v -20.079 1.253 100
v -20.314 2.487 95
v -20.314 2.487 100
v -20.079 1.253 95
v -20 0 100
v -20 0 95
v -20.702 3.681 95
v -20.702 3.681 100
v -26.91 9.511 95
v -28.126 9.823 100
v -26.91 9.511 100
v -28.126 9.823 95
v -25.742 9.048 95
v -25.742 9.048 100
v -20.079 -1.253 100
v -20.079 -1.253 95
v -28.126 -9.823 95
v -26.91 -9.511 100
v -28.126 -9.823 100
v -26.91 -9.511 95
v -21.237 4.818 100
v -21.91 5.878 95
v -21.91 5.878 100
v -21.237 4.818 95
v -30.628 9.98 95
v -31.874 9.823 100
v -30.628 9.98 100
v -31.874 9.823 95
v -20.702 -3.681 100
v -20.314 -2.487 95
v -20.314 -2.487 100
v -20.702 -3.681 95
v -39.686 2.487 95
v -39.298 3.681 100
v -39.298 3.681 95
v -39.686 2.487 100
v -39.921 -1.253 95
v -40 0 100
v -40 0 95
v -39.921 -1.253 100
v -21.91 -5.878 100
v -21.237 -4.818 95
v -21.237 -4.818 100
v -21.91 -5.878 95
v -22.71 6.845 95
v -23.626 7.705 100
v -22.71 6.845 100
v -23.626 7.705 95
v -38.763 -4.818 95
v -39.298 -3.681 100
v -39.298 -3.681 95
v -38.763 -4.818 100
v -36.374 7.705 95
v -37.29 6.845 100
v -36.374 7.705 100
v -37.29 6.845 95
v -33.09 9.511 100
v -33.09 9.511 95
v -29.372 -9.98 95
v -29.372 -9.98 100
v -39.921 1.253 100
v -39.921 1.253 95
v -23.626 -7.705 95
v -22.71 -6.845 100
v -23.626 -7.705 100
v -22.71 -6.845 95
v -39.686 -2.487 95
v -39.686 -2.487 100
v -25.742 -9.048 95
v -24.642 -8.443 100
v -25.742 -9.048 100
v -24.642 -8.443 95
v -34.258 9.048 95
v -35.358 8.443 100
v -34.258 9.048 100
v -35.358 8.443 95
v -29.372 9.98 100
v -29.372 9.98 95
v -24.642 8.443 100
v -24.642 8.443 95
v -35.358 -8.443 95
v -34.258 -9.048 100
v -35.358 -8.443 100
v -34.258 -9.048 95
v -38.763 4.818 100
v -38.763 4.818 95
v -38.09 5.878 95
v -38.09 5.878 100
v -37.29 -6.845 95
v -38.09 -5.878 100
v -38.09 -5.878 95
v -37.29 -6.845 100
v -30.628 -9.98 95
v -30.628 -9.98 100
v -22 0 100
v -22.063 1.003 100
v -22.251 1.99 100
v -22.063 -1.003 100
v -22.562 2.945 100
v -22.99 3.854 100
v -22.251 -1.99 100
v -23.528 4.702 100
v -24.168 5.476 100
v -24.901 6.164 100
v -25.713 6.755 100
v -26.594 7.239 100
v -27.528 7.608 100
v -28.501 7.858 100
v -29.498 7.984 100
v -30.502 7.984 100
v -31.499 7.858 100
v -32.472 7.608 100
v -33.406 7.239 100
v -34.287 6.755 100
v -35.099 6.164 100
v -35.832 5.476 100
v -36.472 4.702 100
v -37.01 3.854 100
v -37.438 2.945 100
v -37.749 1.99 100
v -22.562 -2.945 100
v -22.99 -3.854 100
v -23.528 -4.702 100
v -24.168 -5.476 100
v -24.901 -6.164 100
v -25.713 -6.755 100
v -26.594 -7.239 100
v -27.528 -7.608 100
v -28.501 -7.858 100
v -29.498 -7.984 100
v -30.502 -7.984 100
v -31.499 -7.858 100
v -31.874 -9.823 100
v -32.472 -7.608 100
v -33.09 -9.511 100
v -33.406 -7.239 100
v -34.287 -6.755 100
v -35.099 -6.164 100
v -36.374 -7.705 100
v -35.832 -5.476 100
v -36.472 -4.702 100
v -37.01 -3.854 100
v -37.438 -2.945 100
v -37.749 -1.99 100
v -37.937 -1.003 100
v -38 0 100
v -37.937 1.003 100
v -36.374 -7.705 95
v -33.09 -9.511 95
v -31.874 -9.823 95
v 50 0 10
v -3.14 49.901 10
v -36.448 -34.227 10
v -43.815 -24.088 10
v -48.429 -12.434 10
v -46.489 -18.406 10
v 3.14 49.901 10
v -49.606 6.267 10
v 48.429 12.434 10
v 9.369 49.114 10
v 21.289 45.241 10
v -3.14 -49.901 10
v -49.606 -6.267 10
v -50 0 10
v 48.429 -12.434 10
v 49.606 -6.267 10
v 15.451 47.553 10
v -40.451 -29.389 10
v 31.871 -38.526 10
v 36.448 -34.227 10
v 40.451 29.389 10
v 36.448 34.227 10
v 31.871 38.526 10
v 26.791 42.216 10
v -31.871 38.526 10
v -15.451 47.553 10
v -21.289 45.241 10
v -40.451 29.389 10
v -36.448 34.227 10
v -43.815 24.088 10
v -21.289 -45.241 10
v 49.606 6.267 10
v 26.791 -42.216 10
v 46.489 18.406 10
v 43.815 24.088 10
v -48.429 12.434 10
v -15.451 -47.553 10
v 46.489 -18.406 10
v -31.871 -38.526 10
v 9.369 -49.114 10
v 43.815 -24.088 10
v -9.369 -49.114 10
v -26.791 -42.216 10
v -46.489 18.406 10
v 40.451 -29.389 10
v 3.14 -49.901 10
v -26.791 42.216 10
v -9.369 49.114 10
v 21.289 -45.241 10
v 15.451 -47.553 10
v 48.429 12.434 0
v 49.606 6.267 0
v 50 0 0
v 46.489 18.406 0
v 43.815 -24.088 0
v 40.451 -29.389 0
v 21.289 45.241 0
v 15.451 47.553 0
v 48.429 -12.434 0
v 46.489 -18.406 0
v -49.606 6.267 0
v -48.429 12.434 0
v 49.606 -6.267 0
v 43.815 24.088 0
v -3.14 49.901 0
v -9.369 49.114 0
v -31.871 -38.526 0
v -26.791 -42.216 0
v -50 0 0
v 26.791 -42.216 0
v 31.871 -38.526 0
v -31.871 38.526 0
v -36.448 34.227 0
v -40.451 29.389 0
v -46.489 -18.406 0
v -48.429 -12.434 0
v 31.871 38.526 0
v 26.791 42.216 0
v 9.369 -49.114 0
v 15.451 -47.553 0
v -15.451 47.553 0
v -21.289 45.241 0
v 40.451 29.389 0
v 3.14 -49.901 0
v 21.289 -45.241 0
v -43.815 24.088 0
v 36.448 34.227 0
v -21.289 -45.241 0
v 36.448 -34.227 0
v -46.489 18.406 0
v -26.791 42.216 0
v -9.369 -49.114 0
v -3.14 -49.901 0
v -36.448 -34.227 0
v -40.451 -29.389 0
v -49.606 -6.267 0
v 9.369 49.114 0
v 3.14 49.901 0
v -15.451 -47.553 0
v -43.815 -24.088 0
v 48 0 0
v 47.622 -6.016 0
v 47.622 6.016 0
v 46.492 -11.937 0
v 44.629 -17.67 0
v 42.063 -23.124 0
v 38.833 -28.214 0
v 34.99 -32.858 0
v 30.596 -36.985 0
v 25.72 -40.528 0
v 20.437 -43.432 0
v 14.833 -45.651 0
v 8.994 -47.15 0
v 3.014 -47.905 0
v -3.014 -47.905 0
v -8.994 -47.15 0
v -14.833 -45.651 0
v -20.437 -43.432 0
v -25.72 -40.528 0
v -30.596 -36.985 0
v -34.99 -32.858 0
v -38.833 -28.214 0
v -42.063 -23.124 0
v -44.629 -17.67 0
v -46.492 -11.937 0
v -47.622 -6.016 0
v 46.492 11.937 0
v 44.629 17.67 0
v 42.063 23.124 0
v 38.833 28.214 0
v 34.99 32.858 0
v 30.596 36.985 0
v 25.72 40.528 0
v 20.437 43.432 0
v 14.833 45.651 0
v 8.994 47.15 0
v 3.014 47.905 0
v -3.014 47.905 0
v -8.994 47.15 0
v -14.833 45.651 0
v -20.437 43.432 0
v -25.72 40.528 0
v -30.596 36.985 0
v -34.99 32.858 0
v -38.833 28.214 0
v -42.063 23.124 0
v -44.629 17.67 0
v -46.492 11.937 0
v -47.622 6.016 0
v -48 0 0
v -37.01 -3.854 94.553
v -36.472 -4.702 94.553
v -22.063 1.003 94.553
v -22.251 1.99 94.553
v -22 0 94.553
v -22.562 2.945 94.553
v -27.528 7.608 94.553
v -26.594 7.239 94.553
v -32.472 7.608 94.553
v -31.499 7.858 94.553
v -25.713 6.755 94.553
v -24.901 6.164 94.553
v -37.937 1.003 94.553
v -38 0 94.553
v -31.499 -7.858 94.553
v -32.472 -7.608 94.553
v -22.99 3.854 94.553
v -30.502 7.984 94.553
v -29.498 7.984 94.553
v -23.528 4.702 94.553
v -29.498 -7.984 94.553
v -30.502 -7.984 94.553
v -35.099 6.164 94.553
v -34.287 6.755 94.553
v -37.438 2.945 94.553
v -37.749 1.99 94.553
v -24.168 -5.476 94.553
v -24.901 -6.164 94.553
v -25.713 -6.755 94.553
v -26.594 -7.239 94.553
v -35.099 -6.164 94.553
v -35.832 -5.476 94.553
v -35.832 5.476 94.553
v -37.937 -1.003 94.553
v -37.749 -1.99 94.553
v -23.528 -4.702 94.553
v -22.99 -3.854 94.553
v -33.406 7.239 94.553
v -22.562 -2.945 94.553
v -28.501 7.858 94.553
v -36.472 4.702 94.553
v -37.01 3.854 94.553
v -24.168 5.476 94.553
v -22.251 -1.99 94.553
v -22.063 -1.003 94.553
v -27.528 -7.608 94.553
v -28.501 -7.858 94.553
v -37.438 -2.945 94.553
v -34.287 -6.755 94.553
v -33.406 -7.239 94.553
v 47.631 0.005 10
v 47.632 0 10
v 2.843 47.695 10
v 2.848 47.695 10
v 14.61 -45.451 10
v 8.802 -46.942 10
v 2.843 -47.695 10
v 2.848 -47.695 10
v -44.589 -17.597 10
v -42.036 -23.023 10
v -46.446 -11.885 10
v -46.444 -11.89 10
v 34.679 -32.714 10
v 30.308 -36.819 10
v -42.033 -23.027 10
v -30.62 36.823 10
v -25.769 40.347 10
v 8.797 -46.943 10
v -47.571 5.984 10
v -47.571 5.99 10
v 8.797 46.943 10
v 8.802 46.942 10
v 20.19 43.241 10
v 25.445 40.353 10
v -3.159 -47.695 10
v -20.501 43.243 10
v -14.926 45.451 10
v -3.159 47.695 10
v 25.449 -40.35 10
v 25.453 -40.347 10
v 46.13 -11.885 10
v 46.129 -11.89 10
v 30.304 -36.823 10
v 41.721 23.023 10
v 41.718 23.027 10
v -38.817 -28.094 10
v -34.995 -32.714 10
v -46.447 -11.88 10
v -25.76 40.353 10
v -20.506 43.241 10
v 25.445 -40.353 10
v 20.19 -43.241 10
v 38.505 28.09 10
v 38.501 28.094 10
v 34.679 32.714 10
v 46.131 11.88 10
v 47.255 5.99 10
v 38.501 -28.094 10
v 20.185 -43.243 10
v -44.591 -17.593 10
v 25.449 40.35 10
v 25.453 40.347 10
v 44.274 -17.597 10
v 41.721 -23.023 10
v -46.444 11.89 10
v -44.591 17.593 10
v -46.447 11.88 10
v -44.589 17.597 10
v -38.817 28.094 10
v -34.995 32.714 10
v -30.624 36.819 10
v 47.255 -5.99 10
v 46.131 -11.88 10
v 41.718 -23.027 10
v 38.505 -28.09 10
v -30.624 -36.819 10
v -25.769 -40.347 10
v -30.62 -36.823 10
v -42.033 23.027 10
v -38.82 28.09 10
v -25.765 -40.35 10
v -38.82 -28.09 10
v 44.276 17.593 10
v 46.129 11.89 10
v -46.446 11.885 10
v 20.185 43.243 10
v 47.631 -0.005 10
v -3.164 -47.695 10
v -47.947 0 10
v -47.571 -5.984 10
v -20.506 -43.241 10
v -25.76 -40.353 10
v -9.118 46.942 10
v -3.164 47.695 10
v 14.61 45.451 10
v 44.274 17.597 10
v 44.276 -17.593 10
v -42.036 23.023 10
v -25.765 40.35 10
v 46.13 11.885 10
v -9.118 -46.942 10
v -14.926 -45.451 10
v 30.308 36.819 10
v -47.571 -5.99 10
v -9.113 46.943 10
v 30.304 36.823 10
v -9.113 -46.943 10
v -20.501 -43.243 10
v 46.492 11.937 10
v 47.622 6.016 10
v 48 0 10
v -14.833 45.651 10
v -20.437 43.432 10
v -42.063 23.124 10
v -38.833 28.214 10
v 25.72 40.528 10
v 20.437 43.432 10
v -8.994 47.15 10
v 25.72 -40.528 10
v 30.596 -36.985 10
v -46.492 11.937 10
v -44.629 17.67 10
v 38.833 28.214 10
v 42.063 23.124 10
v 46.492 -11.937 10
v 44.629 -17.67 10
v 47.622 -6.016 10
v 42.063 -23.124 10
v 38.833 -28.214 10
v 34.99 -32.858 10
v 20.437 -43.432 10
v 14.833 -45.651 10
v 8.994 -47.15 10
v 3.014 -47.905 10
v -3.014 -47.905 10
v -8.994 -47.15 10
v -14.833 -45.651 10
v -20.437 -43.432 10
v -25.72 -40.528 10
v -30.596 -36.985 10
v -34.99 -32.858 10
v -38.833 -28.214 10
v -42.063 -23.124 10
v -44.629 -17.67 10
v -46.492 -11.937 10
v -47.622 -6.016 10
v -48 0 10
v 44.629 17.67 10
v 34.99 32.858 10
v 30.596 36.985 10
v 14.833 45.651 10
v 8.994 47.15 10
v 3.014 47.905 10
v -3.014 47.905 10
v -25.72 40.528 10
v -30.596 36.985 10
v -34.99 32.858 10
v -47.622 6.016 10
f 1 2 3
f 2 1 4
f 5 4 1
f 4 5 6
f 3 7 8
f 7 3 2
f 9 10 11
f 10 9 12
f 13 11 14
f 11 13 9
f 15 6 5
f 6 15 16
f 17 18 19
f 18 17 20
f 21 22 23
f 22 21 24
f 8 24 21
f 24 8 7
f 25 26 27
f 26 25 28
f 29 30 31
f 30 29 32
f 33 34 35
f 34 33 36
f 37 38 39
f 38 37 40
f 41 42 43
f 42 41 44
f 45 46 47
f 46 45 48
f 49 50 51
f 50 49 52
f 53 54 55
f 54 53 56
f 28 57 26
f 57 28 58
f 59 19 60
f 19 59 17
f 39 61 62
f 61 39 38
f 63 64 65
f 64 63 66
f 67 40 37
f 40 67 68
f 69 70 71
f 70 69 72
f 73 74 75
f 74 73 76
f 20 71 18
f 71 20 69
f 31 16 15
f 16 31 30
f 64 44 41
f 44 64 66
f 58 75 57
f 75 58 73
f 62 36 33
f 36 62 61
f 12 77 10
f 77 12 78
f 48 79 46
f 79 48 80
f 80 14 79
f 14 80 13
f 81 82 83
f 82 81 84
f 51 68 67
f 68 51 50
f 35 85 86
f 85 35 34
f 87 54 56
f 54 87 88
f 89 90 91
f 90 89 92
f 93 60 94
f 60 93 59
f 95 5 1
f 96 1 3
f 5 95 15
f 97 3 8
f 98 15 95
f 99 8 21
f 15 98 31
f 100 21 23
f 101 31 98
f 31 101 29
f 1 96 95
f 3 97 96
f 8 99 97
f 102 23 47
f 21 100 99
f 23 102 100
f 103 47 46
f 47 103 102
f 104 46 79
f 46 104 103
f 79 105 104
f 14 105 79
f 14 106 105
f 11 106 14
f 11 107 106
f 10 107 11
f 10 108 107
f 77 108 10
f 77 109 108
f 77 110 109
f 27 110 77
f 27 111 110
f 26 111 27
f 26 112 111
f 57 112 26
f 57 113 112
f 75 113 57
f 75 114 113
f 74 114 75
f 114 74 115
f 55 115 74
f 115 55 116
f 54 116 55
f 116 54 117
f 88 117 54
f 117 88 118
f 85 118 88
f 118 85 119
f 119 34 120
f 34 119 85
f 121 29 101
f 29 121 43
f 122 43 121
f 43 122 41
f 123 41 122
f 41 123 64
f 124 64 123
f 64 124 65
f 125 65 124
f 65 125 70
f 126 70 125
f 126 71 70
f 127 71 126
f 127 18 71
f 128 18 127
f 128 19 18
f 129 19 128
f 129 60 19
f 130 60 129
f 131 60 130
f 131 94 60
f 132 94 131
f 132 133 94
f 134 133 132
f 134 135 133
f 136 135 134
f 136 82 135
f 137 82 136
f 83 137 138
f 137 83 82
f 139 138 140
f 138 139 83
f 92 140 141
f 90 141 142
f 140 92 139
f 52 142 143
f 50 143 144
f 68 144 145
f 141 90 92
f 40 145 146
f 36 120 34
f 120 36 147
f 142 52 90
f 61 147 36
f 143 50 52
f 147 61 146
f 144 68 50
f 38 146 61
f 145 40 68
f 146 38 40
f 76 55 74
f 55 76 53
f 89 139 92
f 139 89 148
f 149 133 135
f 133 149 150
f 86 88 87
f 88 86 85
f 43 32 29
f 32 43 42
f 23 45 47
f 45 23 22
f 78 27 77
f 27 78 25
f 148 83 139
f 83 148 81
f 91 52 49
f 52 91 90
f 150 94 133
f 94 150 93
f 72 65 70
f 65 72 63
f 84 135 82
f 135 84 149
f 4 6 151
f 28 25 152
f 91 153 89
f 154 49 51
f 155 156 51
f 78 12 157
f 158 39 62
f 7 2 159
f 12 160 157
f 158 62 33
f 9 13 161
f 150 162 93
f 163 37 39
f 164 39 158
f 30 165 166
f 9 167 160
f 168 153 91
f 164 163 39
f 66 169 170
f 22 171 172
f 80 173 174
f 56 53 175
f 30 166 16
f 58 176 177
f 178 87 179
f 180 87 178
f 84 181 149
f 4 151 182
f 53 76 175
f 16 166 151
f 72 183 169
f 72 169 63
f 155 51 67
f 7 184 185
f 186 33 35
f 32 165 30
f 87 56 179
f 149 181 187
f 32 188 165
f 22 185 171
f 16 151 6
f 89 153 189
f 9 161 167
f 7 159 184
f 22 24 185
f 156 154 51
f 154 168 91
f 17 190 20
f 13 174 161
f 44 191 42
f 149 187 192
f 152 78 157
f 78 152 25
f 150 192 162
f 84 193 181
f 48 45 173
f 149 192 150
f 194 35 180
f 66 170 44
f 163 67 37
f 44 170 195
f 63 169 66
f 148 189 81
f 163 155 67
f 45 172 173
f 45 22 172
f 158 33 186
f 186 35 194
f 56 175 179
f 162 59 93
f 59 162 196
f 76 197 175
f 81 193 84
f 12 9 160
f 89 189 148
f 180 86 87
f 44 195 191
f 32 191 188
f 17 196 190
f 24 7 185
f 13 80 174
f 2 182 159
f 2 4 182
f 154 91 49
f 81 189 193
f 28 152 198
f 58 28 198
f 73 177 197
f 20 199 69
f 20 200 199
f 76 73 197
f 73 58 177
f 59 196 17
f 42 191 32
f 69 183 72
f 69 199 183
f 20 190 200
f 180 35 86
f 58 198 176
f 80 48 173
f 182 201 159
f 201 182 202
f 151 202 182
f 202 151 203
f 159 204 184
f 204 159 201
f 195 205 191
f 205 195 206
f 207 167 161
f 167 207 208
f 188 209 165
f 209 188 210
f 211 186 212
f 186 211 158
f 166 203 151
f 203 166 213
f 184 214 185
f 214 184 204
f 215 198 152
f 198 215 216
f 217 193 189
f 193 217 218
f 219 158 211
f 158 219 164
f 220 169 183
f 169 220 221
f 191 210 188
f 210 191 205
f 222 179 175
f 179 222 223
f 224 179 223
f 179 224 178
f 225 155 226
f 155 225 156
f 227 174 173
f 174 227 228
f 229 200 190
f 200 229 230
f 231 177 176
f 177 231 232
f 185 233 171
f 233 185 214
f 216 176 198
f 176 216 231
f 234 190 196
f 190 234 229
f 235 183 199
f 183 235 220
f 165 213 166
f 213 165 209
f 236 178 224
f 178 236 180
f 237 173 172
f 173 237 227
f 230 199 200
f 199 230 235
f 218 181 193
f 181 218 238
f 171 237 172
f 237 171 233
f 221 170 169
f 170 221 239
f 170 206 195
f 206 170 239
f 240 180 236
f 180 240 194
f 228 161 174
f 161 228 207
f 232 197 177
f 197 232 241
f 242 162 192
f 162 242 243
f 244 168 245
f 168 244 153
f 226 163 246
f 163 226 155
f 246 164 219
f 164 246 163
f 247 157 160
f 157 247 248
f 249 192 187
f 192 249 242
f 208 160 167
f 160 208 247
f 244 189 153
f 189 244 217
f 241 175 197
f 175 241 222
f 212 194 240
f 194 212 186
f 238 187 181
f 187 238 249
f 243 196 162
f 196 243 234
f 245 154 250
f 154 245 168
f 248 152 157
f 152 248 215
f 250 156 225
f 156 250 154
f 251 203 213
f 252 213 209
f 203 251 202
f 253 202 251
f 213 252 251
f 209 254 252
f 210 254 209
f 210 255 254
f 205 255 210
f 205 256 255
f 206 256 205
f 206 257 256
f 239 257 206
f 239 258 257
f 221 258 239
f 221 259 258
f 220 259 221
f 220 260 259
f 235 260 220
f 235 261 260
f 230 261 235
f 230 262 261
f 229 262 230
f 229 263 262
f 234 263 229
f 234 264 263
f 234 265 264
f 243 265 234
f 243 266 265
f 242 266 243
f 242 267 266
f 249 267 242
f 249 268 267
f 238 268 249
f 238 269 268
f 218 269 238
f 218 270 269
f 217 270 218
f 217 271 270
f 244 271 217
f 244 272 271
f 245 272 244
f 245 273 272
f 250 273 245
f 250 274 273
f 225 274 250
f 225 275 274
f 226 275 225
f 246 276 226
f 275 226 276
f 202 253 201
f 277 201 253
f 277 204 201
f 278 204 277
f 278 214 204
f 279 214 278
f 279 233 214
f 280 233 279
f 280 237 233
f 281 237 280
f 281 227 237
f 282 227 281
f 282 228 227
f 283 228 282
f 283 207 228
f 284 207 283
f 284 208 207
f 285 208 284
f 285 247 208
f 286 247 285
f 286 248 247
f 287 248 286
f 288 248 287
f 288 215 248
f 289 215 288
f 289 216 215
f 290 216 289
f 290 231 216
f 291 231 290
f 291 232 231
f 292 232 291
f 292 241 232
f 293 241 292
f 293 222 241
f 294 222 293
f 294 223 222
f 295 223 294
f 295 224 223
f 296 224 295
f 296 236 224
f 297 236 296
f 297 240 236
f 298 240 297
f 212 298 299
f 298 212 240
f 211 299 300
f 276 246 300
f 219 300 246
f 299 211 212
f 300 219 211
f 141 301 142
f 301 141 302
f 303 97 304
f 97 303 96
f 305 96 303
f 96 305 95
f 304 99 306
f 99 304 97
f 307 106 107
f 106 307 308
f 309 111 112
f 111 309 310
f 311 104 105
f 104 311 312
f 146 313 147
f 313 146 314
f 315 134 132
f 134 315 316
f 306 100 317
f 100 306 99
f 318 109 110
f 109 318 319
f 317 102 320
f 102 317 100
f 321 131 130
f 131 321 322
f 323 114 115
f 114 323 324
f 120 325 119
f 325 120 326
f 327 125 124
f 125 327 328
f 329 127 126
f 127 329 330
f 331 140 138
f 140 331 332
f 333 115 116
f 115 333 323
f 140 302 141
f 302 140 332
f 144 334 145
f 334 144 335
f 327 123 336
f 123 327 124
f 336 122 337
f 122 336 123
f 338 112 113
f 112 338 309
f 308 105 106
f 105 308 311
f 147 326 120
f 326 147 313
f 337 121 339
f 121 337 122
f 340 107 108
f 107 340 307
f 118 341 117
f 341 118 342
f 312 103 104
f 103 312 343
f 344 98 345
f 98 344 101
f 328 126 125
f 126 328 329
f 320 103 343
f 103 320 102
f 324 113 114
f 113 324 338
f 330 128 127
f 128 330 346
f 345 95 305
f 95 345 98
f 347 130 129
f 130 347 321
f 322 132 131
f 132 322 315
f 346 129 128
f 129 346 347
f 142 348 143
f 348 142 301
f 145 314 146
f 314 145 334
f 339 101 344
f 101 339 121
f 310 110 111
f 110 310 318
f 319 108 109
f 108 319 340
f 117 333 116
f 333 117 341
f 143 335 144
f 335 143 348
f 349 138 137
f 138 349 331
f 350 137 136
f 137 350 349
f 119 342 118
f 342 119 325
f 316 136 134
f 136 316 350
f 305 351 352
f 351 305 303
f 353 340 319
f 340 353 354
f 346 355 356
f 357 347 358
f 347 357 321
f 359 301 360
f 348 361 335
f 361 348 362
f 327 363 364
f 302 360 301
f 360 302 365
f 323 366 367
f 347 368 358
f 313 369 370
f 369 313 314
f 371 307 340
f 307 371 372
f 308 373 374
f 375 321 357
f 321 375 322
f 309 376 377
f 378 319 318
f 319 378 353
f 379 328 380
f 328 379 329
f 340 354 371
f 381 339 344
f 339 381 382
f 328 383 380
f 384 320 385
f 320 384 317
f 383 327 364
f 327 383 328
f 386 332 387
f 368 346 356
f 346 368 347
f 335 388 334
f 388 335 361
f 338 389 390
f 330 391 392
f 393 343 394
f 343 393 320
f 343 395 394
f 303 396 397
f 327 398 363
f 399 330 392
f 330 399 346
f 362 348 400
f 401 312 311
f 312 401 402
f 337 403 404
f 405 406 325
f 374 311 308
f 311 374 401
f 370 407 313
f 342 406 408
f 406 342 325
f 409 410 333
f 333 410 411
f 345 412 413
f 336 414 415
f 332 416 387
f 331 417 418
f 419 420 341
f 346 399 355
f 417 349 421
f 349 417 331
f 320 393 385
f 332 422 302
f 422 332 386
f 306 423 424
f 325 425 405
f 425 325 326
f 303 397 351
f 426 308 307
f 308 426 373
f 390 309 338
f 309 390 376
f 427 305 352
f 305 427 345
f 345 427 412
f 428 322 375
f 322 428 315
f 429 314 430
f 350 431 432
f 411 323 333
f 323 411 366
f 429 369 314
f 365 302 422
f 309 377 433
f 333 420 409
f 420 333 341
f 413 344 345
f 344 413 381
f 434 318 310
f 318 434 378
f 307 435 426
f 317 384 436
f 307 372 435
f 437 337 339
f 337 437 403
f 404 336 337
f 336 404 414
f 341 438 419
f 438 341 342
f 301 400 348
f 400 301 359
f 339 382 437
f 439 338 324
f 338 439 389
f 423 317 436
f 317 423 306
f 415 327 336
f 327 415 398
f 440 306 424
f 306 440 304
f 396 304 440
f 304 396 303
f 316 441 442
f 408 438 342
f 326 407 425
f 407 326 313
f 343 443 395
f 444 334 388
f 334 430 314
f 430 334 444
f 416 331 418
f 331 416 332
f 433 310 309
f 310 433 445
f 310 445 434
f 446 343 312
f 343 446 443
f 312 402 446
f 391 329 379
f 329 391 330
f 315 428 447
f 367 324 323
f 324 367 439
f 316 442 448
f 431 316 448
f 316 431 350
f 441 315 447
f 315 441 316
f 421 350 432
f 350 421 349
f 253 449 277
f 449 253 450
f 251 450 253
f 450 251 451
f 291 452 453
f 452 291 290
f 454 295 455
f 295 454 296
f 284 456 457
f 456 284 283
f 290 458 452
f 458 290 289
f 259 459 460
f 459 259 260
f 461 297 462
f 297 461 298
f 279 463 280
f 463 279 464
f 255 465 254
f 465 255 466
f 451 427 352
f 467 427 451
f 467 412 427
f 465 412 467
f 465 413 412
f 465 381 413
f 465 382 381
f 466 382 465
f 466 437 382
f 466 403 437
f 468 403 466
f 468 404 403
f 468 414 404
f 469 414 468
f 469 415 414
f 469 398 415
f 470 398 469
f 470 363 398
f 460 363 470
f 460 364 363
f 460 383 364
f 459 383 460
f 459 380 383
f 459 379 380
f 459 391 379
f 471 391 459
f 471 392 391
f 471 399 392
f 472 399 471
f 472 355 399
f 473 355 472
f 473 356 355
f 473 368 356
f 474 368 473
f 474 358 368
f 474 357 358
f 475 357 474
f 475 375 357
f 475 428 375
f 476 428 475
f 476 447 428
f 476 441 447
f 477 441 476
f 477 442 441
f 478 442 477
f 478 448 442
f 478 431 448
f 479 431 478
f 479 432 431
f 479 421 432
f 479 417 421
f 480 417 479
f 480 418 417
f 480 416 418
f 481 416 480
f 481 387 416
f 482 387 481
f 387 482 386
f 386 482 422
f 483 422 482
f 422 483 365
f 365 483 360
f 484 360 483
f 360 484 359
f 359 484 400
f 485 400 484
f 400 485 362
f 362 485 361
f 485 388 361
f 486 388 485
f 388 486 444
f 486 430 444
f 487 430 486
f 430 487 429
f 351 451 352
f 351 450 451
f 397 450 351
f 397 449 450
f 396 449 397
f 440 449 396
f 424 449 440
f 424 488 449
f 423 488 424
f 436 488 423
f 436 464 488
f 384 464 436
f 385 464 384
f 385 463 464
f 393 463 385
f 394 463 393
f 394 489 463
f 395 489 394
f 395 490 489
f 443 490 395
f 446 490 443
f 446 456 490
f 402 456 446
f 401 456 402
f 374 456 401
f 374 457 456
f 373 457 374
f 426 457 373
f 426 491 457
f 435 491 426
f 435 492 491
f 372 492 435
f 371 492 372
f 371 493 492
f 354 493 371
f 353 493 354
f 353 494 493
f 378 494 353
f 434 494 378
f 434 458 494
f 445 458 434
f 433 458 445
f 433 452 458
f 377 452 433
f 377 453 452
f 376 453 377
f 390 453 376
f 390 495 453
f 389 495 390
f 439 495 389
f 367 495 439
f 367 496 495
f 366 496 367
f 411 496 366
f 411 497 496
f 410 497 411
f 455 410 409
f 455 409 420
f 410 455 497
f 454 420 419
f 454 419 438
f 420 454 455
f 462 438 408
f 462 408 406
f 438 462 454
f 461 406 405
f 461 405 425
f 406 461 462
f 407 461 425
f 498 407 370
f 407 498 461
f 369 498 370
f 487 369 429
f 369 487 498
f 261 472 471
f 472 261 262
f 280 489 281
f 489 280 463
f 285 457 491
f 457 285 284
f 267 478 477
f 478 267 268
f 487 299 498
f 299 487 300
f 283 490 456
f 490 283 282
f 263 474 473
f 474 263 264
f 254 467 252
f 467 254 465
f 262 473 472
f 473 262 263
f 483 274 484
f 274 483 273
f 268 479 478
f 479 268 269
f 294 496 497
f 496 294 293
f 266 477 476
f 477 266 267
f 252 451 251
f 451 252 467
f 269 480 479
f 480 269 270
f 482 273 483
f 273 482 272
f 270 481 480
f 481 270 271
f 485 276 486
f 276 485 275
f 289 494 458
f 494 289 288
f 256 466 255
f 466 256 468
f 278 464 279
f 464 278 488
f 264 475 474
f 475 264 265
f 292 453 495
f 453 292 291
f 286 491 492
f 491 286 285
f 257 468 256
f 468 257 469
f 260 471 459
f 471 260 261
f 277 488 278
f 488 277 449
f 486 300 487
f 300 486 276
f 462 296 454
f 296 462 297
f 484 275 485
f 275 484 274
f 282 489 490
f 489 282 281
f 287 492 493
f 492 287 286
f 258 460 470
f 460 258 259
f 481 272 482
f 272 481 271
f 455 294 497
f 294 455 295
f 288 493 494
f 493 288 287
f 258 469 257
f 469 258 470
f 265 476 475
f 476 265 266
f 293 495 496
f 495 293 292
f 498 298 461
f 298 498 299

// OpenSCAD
// preview[view:south, tilt:top diagonal]

//*********Declaration of customization variables************

//What outer diameter should the large opening have?
Large_End_Diameter = 100;

//What outer diameter should the small opening have?
Small_End_Diameter = 20;

//How thick should the walls be?
Wall_Thickness = 2; // [1:5]

//What's the overall height of the funnel?
Funnel_Height = 100;

//How tall should the band on the top be before the funnel begins?
Top_Band = 10;

//How long should the spout on the bottom be after the funnel ends?
Bottom_Spout_Length = 5;

//How much offset between the middle of the top and bottom of the funnel?
Offset = 30;

//**********Assignment of customization vars to original scad vars***

spout_or = Small_End_Diameter/2;  //outer radius of bottom opening / spout
wall = Wall_Thickness; //wall thickness
flare_percentage = Large_End_Diameter / Small_End_Diameter * 100; // ratio of funnel opening (top) to spout (bottom), expressed as percentage
height = Funnel_Height; //total height
bottom_band=Bottom_Spout_Length;

res = 100/2; //resolution for cylinders
plane = 0.01/1;

//**********calculated variables*******************

spout_ir = spout_or - wall;
top_or = spout_or*flare_percentage/100;
top_ir = top_or - wall;

h1 = bottom_band;
h2 = height - Top_Band;
funnel_rise = height - bottom_band - Top_Band;
hi_adjust_ang = atan((top_or-spout_or)/funnel_rise)/2;
hi_adjust = wall*tan(hi_adjust_ang);
skew=Offset/funnel_rise;

//**********begin build****************************

translate([0,0,height])mirror([0,0,1])
//union()
//{
//difference(){
//}
difference(){

//**********outer shape****************************

union(){

translate([-Offset,0,0])cylinder(h=bottom_band,r=spout_or,$fn=res);
translate([0,0,h1])
translate([0,0,funnel_rise])
multmatrix(m = [ [1, 0, skew , 0],
                 [0, 1, 0, 0],
                 [0, 0, 1, 0],
                 [0, 0, 0,  1]
               ])
translate([0,0,-funnel_rise])
cylinder(h=funnel_rise,r1=spout_or,r2=top_or,$fn=res);

translate([0,0,h2])cylinder(h=Top_Band,r=top_or,$fn=res);

}

//**********inner shape****************************

union(){

translate([-Offset,0,0])cylinder(h=bottom_band+plane+hi_adjust,r=spout_ir,$fn=res);
translate([0,0,h1+hi_adjust])
translate([0,0,funnel_rise])
multmatrix(m = [ [1, 0, skew , 0],
                 [0, 1, 0, 0],
                 [0, 0, 1, 0],
                 [0, 0, 0,  1]
               ])
translate([0,0,-funnel_rise]){
cylinder(h=funnel_rise,r1=spout_ir,r2=top_ir,$fn=res);
}
translate([0,0,h2])cylinder(h=Top_Band+hi_adjust+plane,r=top_ir,$fn=res);
//translate([-2*Large_End_Diameter,0,0])cube([4*Large_End_Diameter,Large_End_Diameter,Funnel_Height]); //cut for inspection of inner geometry


}
}
